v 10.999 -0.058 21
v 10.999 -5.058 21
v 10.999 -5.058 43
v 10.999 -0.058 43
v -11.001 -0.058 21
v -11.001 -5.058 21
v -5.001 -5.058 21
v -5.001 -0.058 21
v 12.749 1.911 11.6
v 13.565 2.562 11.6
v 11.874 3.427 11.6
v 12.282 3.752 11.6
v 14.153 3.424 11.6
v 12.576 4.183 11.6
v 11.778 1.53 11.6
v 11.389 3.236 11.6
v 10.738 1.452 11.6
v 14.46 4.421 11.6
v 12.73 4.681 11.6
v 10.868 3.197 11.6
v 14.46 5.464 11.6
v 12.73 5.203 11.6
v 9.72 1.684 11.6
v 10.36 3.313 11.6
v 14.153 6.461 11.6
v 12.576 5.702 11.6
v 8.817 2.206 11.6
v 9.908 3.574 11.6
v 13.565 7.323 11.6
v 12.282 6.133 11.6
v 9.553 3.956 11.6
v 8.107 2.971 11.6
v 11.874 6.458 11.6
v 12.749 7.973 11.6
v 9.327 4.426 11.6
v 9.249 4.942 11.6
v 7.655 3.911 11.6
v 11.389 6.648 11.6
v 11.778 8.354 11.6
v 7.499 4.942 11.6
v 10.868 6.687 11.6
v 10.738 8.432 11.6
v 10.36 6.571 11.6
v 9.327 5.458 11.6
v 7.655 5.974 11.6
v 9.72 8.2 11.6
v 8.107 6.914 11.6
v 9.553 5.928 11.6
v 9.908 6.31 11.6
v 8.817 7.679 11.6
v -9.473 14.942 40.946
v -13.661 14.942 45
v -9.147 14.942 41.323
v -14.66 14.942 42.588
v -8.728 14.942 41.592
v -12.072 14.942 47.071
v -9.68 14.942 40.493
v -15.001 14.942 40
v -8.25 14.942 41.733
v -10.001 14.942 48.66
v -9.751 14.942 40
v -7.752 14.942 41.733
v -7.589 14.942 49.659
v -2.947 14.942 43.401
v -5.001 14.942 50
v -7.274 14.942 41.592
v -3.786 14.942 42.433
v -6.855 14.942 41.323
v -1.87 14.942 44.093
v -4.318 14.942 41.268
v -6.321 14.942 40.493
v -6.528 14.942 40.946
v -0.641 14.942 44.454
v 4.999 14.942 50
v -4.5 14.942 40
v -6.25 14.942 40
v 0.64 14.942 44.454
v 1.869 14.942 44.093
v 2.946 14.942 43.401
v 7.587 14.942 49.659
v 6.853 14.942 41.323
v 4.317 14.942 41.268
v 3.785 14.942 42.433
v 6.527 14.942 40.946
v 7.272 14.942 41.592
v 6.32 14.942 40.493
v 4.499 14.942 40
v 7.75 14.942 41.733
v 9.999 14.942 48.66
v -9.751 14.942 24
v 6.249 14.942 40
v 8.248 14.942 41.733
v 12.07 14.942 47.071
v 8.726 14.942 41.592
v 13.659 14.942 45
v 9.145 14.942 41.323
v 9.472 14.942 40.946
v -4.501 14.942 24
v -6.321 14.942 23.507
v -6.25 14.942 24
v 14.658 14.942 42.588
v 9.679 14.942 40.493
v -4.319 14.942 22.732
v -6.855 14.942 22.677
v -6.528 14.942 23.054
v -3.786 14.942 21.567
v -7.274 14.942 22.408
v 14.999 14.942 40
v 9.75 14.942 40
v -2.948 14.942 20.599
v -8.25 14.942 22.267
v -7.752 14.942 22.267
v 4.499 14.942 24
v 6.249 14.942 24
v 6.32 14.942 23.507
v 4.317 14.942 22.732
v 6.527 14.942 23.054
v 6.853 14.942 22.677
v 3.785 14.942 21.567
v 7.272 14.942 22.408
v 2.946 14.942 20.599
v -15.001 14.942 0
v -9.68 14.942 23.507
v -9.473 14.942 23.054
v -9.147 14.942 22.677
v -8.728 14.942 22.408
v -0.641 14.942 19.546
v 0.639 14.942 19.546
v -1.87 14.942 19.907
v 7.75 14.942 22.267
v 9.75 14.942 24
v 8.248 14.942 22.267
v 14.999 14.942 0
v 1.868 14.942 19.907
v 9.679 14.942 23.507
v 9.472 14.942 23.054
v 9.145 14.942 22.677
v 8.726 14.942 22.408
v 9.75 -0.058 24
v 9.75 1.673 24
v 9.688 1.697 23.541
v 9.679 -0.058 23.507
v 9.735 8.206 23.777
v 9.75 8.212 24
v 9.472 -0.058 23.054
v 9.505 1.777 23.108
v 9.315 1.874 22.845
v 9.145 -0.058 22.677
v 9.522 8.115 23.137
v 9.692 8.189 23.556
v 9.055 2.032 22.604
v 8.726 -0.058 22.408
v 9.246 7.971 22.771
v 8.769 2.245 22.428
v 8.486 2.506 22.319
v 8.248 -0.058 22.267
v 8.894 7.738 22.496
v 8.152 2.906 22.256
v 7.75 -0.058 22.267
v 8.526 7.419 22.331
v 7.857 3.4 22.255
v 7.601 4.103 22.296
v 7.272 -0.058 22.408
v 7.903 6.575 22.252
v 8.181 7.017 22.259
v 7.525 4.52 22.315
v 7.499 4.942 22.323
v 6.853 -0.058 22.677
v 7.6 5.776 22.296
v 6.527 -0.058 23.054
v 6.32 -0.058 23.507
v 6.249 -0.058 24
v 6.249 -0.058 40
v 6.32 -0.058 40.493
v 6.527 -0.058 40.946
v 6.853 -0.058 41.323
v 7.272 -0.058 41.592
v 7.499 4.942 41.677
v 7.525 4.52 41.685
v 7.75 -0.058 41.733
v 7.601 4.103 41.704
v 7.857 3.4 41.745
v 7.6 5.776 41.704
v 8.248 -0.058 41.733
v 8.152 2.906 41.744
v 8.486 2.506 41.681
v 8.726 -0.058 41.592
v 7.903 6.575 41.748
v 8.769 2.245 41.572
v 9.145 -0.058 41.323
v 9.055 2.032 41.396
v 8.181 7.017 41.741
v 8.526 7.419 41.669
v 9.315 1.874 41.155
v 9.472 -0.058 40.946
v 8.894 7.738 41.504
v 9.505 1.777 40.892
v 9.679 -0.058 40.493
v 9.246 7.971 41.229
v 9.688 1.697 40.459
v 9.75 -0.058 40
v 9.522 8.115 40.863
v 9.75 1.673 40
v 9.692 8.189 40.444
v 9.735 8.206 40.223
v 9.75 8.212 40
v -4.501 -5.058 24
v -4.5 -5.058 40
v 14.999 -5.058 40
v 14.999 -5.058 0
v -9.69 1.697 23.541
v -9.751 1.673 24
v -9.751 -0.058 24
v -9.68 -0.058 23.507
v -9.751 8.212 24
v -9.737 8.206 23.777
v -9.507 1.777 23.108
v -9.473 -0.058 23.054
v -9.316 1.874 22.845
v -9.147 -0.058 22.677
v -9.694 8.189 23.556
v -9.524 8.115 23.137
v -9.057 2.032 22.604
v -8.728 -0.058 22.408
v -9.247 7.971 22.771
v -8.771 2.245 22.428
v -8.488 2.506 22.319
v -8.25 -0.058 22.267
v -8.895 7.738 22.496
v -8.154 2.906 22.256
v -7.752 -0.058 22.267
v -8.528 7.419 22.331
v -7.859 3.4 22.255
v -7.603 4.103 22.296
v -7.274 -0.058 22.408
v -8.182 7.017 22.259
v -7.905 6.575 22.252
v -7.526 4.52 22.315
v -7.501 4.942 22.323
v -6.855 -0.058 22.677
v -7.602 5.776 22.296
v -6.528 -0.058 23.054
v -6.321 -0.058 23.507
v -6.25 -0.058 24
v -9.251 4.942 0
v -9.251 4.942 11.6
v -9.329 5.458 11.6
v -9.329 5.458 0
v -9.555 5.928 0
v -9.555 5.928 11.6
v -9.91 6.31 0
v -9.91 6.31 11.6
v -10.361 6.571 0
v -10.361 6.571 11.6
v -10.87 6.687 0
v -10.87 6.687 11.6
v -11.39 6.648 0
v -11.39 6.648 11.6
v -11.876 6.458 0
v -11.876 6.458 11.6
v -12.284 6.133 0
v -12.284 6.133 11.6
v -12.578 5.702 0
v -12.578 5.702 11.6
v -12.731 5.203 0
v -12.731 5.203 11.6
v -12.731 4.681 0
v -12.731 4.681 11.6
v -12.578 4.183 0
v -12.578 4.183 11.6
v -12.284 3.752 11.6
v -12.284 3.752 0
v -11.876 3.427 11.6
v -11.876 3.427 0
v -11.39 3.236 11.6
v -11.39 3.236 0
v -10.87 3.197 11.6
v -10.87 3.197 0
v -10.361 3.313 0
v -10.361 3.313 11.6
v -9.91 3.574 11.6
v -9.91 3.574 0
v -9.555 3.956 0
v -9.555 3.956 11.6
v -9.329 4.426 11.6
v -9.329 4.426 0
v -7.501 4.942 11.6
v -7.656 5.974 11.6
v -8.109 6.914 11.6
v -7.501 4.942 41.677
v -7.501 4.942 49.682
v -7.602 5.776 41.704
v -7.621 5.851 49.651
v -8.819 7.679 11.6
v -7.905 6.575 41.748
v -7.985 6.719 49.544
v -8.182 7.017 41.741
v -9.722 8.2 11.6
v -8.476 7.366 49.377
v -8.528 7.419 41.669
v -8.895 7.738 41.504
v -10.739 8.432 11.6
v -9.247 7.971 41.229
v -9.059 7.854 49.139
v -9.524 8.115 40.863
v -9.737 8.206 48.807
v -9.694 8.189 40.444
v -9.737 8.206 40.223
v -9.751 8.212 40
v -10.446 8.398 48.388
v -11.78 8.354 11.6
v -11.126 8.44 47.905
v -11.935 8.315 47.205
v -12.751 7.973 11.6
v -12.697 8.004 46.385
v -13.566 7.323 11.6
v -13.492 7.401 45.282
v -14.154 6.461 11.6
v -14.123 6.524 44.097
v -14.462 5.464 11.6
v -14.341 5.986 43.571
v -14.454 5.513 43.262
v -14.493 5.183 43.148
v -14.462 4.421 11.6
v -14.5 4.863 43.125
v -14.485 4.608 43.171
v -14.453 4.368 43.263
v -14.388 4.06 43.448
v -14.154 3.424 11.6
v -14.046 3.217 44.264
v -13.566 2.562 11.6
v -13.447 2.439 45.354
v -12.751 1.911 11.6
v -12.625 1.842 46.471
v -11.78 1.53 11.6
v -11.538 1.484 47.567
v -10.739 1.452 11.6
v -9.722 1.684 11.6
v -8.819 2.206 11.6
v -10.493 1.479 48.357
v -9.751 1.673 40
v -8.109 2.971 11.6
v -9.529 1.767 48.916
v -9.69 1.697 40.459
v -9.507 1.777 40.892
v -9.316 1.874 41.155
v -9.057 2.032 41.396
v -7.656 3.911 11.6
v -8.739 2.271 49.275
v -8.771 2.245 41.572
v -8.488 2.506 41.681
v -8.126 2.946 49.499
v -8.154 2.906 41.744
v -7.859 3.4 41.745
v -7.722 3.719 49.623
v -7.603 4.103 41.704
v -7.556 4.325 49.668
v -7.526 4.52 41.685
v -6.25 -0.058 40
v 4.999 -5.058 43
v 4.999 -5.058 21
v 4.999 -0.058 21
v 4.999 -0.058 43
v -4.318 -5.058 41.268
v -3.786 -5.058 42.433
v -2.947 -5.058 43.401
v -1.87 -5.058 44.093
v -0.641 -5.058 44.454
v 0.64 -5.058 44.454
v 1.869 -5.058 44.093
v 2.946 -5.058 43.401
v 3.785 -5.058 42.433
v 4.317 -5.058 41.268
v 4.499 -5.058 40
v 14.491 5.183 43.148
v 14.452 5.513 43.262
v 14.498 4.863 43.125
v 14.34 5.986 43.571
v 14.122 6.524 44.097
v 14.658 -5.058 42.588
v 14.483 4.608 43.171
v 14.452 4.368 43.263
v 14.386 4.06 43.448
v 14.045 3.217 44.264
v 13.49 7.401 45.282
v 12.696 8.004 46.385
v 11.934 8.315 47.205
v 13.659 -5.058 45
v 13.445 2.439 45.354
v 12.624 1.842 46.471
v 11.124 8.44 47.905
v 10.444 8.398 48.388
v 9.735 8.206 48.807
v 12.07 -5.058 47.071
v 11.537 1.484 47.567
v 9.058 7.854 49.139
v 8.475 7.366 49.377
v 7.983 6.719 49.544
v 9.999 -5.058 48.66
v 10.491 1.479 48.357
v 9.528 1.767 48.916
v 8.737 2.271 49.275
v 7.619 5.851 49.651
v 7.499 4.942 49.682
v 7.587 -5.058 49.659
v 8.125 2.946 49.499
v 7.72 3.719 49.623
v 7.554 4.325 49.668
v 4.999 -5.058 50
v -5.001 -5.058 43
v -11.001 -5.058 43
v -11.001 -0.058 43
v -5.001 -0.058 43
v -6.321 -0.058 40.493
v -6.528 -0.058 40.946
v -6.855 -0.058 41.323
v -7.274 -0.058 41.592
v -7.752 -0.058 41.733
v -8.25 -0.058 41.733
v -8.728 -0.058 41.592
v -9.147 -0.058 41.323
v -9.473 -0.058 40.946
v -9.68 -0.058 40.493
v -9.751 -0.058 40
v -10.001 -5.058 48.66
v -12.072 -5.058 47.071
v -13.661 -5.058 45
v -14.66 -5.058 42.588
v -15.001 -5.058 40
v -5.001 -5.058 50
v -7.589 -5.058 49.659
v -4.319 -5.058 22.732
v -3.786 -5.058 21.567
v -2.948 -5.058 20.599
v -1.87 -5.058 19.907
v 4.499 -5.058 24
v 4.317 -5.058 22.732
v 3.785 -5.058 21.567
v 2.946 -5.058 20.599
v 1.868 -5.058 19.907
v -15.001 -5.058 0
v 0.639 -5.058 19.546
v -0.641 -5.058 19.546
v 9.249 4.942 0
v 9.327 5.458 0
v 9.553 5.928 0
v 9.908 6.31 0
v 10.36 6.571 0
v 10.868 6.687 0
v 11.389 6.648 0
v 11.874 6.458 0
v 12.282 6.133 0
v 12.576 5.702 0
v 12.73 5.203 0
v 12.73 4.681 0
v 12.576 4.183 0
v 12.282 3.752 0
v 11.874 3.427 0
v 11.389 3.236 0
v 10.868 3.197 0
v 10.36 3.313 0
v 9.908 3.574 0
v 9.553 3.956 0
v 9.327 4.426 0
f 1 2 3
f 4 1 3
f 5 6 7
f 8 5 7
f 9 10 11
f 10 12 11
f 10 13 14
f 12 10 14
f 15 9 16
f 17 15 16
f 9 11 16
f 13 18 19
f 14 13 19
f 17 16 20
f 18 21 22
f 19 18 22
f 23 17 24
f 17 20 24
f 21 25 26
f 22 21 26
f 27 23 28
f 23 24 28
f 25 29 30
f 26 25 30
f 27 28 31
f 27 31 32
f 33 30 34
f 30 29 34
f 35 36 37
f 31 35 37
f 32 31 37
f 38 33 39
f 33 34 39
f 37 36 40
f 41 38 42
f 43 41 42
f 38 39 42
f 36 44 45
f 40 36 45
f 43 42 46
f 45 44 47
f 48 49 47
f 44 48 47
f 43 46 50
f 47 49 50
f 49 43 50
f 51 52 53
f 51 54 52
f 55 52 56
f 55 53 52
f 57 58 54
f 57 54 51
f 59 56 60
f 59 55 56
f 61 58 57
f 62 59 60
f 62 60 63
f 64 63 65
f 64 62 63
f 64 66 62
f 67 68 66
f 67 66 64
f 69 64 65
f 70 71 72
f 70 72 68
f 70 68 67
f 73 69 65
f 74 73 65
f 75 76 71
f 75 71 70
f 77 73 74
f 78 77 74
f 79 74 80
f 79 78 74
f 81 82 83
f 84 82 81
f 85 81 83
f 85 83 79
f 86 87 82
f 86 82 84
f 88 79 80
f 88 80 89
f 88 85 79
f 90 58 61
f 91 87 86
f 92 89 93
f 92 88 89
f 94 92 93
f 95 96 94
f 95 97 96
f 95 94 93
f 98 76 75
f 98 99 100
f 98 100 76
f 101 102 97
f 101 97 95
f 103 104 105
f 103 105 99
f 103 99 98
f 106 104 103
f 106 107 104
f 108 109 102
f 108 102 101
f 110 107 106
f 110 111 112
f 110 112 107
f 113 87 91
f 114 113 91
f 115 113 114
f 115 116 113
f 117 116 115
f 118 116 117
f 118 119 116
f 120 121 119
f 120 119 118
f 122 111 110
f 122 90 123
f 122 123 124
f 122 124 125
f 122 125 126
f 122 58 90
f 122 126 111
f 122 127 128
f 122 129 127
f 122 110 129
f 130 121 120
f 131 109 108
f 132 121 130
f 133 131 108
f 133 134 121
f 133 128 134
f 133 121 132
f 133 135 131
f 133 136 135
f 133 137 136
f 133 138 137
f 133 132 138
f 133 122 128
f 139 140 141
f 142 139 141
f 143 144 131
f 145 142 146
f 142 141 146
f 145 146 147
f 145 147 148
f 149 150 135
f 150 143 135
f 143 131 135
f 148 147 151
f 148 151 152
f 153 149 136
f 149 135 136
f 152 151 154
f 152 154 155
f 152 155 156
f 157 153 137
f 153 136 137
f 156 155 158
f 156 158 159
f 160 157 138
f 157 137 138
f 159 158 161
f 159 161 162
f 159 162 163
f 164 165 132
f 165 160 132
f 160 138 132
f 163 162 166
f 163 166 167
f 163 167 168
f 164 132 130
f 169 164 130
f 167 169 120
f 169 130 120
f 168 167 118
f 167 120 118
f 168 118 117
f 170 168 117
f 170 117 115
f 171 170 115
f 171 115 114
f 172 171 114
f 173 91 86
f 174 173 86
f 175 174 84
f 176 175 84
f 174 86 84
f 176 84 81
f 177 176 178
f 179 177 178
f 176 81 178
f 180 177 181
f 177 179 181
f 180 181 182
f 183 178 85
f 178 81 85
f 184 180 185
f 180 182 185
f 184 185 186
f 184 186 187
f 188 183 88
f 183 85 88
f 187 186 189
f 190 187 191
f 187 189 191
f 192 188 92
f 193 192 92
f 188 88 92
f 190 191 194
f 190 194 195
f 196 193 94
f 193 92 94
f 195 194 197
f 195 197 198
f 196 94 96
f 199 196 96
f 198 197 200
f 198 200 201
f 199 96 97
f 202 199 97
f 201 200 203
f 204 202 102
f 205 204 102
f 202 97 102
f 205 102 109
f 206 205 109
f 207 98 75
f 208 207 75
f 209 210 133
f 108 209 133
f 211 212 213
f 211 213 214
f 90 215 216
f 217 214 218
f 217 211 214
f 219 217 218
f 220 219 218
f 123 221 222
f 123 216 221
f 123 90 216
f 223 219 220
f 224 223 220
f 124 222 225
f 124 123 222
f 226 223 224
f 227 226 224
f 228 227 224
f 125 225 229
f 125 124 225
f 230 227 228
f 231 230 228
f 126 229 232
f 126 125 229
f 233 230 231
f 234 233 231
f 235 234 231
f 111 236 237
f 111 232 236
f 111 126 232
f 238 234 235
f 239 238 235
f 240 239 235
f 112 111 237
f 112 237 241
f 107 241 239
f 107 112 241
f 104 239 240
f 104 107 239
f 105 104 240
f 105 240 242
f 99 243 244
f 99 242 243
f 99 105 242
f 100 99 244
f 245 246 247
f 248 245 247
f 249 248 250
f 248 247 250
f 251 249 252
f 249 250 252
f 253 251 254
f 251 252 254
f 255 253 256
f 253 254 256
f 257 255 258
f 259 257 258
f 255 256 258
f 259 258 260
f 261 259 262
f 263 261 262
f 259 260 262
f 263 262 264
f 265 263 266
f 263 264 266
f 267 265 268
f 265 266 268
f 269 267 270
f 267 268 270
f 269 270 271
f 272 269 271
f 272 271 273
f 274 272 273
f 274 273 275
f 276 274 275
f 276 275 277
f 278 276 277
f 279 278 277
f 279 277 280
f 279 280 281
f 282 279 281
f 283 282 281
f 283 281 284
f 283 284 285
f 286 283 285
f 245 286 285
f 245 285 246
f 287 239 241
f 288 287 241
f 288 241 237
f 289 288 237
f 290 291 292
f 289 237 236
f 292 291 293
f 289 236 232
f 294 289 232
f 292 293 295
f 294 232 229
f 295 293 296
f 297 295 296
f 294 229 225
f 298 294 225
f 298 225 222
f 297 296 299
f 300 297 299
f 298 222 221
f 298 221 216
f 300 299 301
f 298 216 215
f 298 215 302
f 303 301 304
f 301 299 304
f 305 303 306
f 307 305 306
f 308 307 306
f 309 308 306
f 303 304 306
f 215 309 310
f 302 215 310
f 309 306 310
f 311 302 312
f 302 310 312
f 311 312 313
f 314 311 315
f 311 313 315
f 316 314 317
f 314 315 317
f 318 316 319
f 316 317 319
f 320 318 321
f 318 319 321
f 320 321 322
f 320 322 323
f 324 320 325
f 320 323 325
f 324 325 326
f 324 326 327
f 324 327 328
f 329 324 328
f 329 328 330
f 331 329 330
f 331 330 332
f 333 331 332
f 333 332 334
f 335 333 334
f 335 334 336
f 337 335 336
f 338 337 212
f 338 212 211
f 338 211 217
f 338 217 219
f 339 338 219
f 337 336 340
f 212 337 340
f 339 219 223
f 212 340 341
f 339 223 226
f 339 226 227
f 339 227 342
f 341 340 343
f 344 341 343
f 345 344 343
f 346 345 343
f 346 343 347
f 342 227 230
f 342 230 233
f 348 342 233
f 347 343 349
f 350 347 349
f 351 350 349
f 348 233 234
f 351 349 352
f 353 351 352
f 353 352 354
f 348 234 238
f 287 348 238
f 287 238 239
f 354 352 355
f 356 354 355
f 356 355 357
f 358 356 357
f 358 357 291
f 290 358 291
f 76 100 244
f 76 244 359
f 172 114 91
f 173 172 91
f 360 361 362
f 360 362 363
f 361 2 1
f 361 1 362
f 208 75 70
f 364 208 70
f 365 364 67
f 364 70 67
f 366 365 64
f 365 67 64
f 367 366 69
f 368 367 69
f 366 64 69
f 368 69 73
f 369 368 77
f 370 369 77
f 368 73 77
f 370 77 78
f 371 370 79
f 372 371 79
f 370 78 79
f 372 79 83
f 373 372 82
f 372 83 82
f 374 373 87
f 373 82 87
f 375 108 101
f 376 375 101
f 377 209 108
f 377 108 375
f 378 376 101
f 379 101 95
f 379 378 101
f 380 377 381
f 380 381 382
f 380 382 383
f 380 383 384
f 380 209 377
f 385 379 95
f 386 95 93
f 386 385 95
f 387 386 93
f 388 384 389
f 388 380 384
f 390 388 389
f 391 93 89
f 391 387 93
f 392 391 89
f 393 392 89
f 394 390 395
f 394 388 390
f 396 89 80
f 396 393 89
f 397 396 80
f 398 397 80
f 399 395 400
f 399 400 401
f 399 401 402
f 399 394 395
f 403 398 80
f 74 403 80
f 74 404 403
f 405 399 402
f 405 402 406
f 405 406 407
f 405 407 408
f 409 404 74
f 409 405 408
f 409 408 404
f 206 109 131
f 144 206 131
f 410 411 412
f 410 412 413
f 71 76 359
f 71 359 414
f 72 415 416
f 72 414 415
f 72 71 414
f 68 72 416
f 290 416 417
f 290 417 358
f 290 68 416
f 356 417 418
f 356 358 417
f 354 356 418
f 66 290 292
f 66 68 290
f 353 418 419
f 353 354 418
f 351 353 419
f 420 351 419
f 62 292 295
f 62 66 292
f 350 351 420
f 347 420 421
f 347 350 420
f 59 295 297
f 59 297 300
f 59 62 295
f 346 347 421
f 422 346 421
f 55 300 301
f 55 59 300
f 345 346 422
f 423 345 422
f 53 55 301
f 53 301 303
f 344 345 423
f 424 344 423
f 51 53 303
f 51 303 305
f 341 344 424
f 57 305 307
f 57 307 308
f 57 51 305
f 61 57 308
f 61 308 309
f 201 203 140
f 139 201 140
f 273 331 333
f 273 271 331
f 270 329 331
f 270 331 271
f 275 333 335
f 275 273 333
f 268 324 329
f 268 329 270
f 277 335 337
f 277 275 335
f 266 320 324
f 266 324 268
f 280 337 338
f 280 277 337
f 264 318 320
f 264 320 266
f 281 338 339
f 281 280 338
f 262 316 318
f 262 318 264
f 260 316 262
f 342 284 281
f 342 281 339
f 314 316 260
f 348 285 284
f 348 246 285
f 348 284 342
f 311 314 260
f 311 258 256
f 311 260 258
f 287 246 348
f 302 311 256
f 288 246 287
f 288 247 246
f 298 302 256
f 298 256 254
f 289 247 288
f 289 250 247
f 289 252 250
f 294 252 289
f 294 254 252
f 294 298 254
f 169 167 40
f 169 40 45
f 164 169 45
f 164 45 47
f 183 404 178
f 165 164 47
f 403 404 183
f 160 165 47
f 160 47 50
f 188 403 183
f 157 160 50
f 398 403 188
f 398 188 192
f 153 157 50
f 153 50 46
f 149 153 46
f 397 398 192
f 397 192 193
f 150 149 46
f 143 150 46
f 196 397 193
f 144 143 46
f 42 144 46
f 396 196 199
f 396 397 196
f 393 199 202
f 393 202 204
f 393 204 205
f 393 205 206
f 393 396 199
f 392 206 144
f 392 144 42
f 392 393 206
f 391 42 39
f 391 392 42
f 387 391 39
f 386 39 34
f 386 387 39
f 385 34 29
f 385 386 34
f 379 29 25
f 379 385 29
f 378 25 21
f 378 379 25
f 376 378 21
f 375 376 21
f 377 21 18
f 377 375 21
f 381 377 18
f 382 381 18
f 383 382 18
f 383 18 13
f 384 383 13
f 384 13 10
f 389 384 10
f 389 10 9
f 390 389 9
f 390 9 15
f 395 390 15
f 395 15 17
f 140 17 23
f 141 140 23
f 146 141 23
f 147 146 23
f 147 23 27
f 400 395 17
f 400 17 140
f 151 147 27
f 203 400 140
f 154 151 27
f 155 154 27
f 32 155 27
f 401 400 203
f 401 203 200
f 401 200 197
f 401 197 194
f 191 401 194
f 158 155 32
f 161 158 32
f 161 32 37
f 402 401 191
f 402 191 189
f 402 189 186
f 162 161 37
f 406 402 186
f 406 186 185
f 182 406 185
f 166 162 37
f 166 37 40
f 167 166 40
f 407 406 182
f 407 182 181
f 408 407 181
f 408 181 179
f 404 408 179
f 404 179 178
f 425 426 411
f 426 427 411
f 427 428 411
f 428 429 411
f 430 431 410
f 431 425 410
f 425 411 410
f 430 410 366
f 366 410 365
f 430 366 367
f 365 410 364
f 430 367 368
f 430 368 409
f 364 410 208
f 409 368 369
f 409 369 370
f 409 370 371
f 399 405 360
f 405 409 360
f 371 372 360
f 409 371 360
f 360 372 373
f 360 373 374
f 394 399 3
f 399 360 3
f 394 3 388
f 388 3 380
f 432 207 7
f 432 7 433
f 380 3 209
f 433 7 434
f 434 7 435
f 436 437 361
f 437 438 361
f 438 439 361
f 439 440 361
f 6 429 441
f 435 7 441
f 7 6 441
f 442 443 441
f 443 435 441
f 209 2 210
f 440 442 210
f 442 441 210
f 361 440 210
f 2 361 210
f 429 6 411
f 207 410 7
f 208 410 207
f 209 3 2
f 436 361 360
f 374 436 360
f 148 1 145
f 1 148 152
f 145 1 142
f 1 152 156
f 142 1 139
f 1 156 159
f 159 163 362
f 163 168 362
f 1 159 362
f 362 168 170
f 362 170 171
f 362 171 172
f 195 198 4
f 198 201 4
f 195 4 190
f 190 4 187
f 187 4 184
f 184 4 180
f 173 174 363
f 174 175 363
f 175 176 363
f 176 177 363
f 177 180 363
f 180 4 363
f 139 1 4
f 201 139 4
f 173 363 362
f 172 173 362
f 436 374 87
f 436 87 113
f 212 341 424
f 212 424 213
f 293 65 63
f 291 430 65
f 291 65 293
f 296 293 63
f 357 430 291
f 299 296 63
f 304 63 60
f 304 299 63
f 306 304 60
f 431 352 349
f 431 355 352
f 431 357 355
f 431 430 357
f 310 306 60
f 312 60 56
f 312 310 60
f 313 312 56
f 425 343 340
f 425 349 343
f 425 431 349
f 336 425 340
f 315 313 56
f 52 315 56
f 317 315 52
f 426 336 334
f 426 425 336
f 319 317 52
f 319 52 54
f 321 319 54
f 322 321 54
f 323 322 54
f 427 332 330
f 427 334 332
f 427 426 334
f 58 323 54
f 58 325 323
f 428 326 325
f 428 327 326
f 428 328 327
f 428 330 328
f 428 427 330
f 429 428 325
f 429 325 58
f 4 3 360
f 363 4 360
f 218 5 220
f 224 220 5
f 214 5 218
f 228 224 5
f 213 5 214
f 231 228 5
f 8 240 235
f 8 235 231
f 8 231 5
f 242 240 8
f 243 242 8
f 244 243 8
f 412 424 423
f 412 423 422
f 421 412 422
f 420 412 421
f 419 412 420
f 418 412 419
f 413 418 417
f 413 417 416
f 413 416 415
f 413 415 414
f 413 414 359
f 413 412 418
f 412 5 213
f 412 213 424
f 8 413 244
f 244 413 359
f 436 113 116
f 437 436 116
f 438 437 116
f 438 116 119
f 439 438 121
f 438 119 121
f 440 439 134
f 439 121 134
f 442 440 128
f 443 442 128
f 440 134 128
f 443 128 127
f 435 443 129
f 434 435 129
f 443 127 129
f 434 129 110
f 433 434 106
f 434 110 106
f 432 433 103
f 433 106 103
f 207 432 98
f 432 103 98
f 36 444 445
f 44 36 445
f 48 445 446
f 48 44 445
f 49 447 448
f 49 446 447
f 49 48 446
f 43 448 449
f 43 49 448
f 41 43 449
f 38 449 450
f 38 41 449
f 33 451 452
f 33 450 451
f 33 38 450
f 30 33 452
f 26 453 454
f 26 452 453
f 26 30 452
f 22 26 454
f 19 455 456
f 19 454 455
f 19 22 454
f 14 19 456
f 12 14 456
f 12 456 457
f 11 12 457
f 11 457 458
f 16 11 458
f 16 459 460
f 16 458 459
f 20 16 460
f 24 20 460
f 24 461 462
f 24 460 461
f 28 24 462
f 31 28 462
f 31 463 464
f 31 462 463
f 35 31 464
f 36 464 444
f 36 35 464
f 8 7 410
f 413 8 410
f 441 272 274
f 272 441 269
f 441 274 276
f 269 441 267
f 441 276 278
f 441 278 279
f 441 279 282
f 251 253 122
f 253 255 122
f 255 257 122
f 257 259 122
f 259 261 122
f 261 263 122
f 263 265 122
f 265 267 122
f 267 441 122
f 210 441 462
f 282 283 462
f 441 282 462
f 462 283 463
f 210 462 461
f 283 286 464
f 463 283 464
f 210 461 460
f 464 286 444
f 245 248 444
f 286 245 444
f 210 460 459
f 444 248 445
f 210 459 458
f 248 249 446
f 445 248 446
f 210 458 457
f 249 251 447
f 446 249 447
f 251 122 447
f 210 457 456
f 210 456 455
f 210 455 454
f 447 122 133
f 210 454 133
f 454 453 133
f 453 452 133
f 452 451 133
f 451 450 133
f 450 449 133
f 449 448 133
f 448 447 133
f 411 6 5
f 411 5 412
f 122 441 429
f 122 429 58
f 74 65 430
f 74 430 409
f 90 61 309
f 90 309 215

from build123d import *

# Parameters (mm, degrees)
SKETCH1_W                                           = 30
SKETCH1_H                                           = 20
BOSS_EXTRUDE1_DEPTH                                 = 50
CUT_EXTRUDE5_DEPTH                                  = 56.901917603
CUT_EXTRUDE2_DEPTH                                  = 20
SKETCH6_W                                           = 6
SKETCH6_H                                           = 22
CUT_EXTRUDE3_DEPTH                                  = 5
SKETCH7_R                                           = 1.75
CUT_EXTRUDE4_DEPTH                                  = 55.298200385
CBORE_FOR_M3_HEX_SOCKET_HEAD_CAP_SCREW1_D           = 3.4
CBORE_FOR_M3_HEX_SOCKET_HEAD_CAP_SCREW1_CBORE_D     = 7
CBORE_FOR_M3_HEX_SOCKET_HEAD_CAP_SCREW1_CBORE_DEPTH = 38.4
FILLET1_START                                       = -6
FILLET1_DEPTH                                       = 22


with BuildPart() as part:
    # Sketch1 → Boss-Extrude1 (new body)
    with BuildSketch(Plane.XY):
        with Locations((-0.000813035, 4.942227855)):
            Rectangle(SKETCH1_W, SKETCH1_H)
    extrude(amount=BOSS_EXTRUDE1_DEPTH)

    # Sketch3 → Cut-Extrude5 (cut, through all)
    with BuildSketch(Plane(origin=(0, 14.942227855, 0), x_dir=(1, 0, 0), z_dir=(0, 1, 0))):
        with BuildLine():
            Line((-4.500783142, -24.000000003), (-4.500176076, -40))
            ThreePointArc((-4.500176076, -40), (-0.000631376, -44.4995447), (4.498913324, -40))
            Line((4.498913324, -40), (4.498913324, -24.000000003))
            ThreePointArc((4.498913324, -24.000000003), (-0.000934909, -19.50015177), (-4.500783142, -24.000000003))
        make_face()
    extrude(amount=-CUT_EXTRUDE5_DEPTH, mode=Mode.SUBTRACT)

    # Sketch5 → Cut-Extrude2 (cut)
    with BuildSketch(Plane(origin=(0, 14.942227855, 0), x_dir=(1, 0, 0), z_dir=(0, 1, 0))):
        with BuildLine():
            Line((-9.751131515, -40), (-9.751131515, -24.000000003))
            ThreePointArc((-9.751131515, -24.000000003), (-8.000813035, -22.249681523), (-6.250494556, -24.000000003))
            Line((-6.250494556, -24.000000003), (-6.250494556, -40))
            ThreePointArc((-6.250494556, -40), (-8.000813035, -41.75031848), (-9.751131515, -40))
        make_face()
    cut_extrude2 = extrude(amount=-CUT_EXTRUDE2_DEPTH, mode=Mode.SUBTRACT)

    # Sketch6 → Cut-Extrude3 (cut)
    with BuildSketch(Plane.XZ.offset(5.057772145)):
        with Locations((-8.000813035, 32.000000001)):
            Rectangle(SKETCH6_W, SKETCH6_H)
    cut_extrude3 = extrude(amount=-CUT_EXTRUDE3_DEPTH, mode=Mode.SUBTRACT)

    # Sketch7 → Cut-Extrude4 (cut, through all)
    with BuildSketch(Plane.XY.offset(50)):
        with Locations((-11.000813035, 4.942227855)):
            Circle(SKETCH7_R)
    cut_extrude4 = extrude(amount=-CUT_EXTRUDE4_DEPTH, mode=Mode.SUBTRACT)

    # CBORE for M3 Hex Socket Head Cap Screw1 (through all)
    with Locations(Plane.XY.offset(50)):
        with Locations((-11.000813035, 4.942227855)):
            cbore_for_m3_hex_socket_head_cap_screw1 = CounterBoreHole(CBORE_FOR_M3_HEX_SOCKET_HEAD_CAP_SCREW1_D / 2, CBORE_FOR_M3_HEX_SOCKET_HEAD_CAP_SCREW1_CBORE_D / 2, CBORE_FOR_M3_HEX_SOCKET_HEAD_CAP_SCREW1_CBORE_DEPTH)

    # Fillet1: read off the stored shape, not the designer's step
    # Fillet1 outline → Fillet1 (cut)
    with BuildSketch(Plane(origin=(0, 0, 0), x_dir=(1, 0, 0), z_dir=(0, 1, 0)).offset(FILLET1_START)):
        with BuildLine():
            ThreePointArc((14.999186965, -40), (12.070254777, -47.071067812), (4.999186965, -50))
            Line((4.999186965, -50), (14.999186965, -50))
            Line((14.999186965, -50), (14.999186965, -40))
        make_face()
        with BuildLine():
            Line((-15.000813035, -50), (-5.000813035, -50))
            ThreePointArc((-5.000813035, -50), (-12.071880847, -47.071067812), (-15.000813035, -40))
            Line((-15.000813035, -40), (-15.000813035, -50))
        make_face()
    extrude(amount=FILLET1_DEPTH, mode=Mode.SUBTRACT)

    # Mirror1: Cut-Extrude2, Cut-Extrude3, Cut-Extrude4, CBORE for M3 Hex Socket Head Cap Screw1 across plane
    add(cut_extrude2.mirror(Plane(origin=(-0.000813035, 0, 0), x_dir=(0, 0, 1), z_dir=(1, 0, 0))), mode=Mode.SUBTRACT)
    add(cut_extrude3.mirror(Plane(origin=(-0.000813035, 0, 0), x_dir=(0, 0, 1), z_dir=(1, 0, 0))), mode=Mode.SUBTRACT)
    add(cut_extrude4.mirror(Plane(origin=(-0.000813035, 0, 0), x_dir=(0, 0, 1), z_dir=(1, 0, 0))), mode=Mode.SUBTRACT)
    add(cbore_for_m3_hex_socket_head_cap_screw1.mirror(Plane(origin=(-0.000813035, 0, 0), x_dir=(0, 0, 1), z_dir=(1, 0, 0))), mode=Mode.SUBTRACT)


solid = part.part
